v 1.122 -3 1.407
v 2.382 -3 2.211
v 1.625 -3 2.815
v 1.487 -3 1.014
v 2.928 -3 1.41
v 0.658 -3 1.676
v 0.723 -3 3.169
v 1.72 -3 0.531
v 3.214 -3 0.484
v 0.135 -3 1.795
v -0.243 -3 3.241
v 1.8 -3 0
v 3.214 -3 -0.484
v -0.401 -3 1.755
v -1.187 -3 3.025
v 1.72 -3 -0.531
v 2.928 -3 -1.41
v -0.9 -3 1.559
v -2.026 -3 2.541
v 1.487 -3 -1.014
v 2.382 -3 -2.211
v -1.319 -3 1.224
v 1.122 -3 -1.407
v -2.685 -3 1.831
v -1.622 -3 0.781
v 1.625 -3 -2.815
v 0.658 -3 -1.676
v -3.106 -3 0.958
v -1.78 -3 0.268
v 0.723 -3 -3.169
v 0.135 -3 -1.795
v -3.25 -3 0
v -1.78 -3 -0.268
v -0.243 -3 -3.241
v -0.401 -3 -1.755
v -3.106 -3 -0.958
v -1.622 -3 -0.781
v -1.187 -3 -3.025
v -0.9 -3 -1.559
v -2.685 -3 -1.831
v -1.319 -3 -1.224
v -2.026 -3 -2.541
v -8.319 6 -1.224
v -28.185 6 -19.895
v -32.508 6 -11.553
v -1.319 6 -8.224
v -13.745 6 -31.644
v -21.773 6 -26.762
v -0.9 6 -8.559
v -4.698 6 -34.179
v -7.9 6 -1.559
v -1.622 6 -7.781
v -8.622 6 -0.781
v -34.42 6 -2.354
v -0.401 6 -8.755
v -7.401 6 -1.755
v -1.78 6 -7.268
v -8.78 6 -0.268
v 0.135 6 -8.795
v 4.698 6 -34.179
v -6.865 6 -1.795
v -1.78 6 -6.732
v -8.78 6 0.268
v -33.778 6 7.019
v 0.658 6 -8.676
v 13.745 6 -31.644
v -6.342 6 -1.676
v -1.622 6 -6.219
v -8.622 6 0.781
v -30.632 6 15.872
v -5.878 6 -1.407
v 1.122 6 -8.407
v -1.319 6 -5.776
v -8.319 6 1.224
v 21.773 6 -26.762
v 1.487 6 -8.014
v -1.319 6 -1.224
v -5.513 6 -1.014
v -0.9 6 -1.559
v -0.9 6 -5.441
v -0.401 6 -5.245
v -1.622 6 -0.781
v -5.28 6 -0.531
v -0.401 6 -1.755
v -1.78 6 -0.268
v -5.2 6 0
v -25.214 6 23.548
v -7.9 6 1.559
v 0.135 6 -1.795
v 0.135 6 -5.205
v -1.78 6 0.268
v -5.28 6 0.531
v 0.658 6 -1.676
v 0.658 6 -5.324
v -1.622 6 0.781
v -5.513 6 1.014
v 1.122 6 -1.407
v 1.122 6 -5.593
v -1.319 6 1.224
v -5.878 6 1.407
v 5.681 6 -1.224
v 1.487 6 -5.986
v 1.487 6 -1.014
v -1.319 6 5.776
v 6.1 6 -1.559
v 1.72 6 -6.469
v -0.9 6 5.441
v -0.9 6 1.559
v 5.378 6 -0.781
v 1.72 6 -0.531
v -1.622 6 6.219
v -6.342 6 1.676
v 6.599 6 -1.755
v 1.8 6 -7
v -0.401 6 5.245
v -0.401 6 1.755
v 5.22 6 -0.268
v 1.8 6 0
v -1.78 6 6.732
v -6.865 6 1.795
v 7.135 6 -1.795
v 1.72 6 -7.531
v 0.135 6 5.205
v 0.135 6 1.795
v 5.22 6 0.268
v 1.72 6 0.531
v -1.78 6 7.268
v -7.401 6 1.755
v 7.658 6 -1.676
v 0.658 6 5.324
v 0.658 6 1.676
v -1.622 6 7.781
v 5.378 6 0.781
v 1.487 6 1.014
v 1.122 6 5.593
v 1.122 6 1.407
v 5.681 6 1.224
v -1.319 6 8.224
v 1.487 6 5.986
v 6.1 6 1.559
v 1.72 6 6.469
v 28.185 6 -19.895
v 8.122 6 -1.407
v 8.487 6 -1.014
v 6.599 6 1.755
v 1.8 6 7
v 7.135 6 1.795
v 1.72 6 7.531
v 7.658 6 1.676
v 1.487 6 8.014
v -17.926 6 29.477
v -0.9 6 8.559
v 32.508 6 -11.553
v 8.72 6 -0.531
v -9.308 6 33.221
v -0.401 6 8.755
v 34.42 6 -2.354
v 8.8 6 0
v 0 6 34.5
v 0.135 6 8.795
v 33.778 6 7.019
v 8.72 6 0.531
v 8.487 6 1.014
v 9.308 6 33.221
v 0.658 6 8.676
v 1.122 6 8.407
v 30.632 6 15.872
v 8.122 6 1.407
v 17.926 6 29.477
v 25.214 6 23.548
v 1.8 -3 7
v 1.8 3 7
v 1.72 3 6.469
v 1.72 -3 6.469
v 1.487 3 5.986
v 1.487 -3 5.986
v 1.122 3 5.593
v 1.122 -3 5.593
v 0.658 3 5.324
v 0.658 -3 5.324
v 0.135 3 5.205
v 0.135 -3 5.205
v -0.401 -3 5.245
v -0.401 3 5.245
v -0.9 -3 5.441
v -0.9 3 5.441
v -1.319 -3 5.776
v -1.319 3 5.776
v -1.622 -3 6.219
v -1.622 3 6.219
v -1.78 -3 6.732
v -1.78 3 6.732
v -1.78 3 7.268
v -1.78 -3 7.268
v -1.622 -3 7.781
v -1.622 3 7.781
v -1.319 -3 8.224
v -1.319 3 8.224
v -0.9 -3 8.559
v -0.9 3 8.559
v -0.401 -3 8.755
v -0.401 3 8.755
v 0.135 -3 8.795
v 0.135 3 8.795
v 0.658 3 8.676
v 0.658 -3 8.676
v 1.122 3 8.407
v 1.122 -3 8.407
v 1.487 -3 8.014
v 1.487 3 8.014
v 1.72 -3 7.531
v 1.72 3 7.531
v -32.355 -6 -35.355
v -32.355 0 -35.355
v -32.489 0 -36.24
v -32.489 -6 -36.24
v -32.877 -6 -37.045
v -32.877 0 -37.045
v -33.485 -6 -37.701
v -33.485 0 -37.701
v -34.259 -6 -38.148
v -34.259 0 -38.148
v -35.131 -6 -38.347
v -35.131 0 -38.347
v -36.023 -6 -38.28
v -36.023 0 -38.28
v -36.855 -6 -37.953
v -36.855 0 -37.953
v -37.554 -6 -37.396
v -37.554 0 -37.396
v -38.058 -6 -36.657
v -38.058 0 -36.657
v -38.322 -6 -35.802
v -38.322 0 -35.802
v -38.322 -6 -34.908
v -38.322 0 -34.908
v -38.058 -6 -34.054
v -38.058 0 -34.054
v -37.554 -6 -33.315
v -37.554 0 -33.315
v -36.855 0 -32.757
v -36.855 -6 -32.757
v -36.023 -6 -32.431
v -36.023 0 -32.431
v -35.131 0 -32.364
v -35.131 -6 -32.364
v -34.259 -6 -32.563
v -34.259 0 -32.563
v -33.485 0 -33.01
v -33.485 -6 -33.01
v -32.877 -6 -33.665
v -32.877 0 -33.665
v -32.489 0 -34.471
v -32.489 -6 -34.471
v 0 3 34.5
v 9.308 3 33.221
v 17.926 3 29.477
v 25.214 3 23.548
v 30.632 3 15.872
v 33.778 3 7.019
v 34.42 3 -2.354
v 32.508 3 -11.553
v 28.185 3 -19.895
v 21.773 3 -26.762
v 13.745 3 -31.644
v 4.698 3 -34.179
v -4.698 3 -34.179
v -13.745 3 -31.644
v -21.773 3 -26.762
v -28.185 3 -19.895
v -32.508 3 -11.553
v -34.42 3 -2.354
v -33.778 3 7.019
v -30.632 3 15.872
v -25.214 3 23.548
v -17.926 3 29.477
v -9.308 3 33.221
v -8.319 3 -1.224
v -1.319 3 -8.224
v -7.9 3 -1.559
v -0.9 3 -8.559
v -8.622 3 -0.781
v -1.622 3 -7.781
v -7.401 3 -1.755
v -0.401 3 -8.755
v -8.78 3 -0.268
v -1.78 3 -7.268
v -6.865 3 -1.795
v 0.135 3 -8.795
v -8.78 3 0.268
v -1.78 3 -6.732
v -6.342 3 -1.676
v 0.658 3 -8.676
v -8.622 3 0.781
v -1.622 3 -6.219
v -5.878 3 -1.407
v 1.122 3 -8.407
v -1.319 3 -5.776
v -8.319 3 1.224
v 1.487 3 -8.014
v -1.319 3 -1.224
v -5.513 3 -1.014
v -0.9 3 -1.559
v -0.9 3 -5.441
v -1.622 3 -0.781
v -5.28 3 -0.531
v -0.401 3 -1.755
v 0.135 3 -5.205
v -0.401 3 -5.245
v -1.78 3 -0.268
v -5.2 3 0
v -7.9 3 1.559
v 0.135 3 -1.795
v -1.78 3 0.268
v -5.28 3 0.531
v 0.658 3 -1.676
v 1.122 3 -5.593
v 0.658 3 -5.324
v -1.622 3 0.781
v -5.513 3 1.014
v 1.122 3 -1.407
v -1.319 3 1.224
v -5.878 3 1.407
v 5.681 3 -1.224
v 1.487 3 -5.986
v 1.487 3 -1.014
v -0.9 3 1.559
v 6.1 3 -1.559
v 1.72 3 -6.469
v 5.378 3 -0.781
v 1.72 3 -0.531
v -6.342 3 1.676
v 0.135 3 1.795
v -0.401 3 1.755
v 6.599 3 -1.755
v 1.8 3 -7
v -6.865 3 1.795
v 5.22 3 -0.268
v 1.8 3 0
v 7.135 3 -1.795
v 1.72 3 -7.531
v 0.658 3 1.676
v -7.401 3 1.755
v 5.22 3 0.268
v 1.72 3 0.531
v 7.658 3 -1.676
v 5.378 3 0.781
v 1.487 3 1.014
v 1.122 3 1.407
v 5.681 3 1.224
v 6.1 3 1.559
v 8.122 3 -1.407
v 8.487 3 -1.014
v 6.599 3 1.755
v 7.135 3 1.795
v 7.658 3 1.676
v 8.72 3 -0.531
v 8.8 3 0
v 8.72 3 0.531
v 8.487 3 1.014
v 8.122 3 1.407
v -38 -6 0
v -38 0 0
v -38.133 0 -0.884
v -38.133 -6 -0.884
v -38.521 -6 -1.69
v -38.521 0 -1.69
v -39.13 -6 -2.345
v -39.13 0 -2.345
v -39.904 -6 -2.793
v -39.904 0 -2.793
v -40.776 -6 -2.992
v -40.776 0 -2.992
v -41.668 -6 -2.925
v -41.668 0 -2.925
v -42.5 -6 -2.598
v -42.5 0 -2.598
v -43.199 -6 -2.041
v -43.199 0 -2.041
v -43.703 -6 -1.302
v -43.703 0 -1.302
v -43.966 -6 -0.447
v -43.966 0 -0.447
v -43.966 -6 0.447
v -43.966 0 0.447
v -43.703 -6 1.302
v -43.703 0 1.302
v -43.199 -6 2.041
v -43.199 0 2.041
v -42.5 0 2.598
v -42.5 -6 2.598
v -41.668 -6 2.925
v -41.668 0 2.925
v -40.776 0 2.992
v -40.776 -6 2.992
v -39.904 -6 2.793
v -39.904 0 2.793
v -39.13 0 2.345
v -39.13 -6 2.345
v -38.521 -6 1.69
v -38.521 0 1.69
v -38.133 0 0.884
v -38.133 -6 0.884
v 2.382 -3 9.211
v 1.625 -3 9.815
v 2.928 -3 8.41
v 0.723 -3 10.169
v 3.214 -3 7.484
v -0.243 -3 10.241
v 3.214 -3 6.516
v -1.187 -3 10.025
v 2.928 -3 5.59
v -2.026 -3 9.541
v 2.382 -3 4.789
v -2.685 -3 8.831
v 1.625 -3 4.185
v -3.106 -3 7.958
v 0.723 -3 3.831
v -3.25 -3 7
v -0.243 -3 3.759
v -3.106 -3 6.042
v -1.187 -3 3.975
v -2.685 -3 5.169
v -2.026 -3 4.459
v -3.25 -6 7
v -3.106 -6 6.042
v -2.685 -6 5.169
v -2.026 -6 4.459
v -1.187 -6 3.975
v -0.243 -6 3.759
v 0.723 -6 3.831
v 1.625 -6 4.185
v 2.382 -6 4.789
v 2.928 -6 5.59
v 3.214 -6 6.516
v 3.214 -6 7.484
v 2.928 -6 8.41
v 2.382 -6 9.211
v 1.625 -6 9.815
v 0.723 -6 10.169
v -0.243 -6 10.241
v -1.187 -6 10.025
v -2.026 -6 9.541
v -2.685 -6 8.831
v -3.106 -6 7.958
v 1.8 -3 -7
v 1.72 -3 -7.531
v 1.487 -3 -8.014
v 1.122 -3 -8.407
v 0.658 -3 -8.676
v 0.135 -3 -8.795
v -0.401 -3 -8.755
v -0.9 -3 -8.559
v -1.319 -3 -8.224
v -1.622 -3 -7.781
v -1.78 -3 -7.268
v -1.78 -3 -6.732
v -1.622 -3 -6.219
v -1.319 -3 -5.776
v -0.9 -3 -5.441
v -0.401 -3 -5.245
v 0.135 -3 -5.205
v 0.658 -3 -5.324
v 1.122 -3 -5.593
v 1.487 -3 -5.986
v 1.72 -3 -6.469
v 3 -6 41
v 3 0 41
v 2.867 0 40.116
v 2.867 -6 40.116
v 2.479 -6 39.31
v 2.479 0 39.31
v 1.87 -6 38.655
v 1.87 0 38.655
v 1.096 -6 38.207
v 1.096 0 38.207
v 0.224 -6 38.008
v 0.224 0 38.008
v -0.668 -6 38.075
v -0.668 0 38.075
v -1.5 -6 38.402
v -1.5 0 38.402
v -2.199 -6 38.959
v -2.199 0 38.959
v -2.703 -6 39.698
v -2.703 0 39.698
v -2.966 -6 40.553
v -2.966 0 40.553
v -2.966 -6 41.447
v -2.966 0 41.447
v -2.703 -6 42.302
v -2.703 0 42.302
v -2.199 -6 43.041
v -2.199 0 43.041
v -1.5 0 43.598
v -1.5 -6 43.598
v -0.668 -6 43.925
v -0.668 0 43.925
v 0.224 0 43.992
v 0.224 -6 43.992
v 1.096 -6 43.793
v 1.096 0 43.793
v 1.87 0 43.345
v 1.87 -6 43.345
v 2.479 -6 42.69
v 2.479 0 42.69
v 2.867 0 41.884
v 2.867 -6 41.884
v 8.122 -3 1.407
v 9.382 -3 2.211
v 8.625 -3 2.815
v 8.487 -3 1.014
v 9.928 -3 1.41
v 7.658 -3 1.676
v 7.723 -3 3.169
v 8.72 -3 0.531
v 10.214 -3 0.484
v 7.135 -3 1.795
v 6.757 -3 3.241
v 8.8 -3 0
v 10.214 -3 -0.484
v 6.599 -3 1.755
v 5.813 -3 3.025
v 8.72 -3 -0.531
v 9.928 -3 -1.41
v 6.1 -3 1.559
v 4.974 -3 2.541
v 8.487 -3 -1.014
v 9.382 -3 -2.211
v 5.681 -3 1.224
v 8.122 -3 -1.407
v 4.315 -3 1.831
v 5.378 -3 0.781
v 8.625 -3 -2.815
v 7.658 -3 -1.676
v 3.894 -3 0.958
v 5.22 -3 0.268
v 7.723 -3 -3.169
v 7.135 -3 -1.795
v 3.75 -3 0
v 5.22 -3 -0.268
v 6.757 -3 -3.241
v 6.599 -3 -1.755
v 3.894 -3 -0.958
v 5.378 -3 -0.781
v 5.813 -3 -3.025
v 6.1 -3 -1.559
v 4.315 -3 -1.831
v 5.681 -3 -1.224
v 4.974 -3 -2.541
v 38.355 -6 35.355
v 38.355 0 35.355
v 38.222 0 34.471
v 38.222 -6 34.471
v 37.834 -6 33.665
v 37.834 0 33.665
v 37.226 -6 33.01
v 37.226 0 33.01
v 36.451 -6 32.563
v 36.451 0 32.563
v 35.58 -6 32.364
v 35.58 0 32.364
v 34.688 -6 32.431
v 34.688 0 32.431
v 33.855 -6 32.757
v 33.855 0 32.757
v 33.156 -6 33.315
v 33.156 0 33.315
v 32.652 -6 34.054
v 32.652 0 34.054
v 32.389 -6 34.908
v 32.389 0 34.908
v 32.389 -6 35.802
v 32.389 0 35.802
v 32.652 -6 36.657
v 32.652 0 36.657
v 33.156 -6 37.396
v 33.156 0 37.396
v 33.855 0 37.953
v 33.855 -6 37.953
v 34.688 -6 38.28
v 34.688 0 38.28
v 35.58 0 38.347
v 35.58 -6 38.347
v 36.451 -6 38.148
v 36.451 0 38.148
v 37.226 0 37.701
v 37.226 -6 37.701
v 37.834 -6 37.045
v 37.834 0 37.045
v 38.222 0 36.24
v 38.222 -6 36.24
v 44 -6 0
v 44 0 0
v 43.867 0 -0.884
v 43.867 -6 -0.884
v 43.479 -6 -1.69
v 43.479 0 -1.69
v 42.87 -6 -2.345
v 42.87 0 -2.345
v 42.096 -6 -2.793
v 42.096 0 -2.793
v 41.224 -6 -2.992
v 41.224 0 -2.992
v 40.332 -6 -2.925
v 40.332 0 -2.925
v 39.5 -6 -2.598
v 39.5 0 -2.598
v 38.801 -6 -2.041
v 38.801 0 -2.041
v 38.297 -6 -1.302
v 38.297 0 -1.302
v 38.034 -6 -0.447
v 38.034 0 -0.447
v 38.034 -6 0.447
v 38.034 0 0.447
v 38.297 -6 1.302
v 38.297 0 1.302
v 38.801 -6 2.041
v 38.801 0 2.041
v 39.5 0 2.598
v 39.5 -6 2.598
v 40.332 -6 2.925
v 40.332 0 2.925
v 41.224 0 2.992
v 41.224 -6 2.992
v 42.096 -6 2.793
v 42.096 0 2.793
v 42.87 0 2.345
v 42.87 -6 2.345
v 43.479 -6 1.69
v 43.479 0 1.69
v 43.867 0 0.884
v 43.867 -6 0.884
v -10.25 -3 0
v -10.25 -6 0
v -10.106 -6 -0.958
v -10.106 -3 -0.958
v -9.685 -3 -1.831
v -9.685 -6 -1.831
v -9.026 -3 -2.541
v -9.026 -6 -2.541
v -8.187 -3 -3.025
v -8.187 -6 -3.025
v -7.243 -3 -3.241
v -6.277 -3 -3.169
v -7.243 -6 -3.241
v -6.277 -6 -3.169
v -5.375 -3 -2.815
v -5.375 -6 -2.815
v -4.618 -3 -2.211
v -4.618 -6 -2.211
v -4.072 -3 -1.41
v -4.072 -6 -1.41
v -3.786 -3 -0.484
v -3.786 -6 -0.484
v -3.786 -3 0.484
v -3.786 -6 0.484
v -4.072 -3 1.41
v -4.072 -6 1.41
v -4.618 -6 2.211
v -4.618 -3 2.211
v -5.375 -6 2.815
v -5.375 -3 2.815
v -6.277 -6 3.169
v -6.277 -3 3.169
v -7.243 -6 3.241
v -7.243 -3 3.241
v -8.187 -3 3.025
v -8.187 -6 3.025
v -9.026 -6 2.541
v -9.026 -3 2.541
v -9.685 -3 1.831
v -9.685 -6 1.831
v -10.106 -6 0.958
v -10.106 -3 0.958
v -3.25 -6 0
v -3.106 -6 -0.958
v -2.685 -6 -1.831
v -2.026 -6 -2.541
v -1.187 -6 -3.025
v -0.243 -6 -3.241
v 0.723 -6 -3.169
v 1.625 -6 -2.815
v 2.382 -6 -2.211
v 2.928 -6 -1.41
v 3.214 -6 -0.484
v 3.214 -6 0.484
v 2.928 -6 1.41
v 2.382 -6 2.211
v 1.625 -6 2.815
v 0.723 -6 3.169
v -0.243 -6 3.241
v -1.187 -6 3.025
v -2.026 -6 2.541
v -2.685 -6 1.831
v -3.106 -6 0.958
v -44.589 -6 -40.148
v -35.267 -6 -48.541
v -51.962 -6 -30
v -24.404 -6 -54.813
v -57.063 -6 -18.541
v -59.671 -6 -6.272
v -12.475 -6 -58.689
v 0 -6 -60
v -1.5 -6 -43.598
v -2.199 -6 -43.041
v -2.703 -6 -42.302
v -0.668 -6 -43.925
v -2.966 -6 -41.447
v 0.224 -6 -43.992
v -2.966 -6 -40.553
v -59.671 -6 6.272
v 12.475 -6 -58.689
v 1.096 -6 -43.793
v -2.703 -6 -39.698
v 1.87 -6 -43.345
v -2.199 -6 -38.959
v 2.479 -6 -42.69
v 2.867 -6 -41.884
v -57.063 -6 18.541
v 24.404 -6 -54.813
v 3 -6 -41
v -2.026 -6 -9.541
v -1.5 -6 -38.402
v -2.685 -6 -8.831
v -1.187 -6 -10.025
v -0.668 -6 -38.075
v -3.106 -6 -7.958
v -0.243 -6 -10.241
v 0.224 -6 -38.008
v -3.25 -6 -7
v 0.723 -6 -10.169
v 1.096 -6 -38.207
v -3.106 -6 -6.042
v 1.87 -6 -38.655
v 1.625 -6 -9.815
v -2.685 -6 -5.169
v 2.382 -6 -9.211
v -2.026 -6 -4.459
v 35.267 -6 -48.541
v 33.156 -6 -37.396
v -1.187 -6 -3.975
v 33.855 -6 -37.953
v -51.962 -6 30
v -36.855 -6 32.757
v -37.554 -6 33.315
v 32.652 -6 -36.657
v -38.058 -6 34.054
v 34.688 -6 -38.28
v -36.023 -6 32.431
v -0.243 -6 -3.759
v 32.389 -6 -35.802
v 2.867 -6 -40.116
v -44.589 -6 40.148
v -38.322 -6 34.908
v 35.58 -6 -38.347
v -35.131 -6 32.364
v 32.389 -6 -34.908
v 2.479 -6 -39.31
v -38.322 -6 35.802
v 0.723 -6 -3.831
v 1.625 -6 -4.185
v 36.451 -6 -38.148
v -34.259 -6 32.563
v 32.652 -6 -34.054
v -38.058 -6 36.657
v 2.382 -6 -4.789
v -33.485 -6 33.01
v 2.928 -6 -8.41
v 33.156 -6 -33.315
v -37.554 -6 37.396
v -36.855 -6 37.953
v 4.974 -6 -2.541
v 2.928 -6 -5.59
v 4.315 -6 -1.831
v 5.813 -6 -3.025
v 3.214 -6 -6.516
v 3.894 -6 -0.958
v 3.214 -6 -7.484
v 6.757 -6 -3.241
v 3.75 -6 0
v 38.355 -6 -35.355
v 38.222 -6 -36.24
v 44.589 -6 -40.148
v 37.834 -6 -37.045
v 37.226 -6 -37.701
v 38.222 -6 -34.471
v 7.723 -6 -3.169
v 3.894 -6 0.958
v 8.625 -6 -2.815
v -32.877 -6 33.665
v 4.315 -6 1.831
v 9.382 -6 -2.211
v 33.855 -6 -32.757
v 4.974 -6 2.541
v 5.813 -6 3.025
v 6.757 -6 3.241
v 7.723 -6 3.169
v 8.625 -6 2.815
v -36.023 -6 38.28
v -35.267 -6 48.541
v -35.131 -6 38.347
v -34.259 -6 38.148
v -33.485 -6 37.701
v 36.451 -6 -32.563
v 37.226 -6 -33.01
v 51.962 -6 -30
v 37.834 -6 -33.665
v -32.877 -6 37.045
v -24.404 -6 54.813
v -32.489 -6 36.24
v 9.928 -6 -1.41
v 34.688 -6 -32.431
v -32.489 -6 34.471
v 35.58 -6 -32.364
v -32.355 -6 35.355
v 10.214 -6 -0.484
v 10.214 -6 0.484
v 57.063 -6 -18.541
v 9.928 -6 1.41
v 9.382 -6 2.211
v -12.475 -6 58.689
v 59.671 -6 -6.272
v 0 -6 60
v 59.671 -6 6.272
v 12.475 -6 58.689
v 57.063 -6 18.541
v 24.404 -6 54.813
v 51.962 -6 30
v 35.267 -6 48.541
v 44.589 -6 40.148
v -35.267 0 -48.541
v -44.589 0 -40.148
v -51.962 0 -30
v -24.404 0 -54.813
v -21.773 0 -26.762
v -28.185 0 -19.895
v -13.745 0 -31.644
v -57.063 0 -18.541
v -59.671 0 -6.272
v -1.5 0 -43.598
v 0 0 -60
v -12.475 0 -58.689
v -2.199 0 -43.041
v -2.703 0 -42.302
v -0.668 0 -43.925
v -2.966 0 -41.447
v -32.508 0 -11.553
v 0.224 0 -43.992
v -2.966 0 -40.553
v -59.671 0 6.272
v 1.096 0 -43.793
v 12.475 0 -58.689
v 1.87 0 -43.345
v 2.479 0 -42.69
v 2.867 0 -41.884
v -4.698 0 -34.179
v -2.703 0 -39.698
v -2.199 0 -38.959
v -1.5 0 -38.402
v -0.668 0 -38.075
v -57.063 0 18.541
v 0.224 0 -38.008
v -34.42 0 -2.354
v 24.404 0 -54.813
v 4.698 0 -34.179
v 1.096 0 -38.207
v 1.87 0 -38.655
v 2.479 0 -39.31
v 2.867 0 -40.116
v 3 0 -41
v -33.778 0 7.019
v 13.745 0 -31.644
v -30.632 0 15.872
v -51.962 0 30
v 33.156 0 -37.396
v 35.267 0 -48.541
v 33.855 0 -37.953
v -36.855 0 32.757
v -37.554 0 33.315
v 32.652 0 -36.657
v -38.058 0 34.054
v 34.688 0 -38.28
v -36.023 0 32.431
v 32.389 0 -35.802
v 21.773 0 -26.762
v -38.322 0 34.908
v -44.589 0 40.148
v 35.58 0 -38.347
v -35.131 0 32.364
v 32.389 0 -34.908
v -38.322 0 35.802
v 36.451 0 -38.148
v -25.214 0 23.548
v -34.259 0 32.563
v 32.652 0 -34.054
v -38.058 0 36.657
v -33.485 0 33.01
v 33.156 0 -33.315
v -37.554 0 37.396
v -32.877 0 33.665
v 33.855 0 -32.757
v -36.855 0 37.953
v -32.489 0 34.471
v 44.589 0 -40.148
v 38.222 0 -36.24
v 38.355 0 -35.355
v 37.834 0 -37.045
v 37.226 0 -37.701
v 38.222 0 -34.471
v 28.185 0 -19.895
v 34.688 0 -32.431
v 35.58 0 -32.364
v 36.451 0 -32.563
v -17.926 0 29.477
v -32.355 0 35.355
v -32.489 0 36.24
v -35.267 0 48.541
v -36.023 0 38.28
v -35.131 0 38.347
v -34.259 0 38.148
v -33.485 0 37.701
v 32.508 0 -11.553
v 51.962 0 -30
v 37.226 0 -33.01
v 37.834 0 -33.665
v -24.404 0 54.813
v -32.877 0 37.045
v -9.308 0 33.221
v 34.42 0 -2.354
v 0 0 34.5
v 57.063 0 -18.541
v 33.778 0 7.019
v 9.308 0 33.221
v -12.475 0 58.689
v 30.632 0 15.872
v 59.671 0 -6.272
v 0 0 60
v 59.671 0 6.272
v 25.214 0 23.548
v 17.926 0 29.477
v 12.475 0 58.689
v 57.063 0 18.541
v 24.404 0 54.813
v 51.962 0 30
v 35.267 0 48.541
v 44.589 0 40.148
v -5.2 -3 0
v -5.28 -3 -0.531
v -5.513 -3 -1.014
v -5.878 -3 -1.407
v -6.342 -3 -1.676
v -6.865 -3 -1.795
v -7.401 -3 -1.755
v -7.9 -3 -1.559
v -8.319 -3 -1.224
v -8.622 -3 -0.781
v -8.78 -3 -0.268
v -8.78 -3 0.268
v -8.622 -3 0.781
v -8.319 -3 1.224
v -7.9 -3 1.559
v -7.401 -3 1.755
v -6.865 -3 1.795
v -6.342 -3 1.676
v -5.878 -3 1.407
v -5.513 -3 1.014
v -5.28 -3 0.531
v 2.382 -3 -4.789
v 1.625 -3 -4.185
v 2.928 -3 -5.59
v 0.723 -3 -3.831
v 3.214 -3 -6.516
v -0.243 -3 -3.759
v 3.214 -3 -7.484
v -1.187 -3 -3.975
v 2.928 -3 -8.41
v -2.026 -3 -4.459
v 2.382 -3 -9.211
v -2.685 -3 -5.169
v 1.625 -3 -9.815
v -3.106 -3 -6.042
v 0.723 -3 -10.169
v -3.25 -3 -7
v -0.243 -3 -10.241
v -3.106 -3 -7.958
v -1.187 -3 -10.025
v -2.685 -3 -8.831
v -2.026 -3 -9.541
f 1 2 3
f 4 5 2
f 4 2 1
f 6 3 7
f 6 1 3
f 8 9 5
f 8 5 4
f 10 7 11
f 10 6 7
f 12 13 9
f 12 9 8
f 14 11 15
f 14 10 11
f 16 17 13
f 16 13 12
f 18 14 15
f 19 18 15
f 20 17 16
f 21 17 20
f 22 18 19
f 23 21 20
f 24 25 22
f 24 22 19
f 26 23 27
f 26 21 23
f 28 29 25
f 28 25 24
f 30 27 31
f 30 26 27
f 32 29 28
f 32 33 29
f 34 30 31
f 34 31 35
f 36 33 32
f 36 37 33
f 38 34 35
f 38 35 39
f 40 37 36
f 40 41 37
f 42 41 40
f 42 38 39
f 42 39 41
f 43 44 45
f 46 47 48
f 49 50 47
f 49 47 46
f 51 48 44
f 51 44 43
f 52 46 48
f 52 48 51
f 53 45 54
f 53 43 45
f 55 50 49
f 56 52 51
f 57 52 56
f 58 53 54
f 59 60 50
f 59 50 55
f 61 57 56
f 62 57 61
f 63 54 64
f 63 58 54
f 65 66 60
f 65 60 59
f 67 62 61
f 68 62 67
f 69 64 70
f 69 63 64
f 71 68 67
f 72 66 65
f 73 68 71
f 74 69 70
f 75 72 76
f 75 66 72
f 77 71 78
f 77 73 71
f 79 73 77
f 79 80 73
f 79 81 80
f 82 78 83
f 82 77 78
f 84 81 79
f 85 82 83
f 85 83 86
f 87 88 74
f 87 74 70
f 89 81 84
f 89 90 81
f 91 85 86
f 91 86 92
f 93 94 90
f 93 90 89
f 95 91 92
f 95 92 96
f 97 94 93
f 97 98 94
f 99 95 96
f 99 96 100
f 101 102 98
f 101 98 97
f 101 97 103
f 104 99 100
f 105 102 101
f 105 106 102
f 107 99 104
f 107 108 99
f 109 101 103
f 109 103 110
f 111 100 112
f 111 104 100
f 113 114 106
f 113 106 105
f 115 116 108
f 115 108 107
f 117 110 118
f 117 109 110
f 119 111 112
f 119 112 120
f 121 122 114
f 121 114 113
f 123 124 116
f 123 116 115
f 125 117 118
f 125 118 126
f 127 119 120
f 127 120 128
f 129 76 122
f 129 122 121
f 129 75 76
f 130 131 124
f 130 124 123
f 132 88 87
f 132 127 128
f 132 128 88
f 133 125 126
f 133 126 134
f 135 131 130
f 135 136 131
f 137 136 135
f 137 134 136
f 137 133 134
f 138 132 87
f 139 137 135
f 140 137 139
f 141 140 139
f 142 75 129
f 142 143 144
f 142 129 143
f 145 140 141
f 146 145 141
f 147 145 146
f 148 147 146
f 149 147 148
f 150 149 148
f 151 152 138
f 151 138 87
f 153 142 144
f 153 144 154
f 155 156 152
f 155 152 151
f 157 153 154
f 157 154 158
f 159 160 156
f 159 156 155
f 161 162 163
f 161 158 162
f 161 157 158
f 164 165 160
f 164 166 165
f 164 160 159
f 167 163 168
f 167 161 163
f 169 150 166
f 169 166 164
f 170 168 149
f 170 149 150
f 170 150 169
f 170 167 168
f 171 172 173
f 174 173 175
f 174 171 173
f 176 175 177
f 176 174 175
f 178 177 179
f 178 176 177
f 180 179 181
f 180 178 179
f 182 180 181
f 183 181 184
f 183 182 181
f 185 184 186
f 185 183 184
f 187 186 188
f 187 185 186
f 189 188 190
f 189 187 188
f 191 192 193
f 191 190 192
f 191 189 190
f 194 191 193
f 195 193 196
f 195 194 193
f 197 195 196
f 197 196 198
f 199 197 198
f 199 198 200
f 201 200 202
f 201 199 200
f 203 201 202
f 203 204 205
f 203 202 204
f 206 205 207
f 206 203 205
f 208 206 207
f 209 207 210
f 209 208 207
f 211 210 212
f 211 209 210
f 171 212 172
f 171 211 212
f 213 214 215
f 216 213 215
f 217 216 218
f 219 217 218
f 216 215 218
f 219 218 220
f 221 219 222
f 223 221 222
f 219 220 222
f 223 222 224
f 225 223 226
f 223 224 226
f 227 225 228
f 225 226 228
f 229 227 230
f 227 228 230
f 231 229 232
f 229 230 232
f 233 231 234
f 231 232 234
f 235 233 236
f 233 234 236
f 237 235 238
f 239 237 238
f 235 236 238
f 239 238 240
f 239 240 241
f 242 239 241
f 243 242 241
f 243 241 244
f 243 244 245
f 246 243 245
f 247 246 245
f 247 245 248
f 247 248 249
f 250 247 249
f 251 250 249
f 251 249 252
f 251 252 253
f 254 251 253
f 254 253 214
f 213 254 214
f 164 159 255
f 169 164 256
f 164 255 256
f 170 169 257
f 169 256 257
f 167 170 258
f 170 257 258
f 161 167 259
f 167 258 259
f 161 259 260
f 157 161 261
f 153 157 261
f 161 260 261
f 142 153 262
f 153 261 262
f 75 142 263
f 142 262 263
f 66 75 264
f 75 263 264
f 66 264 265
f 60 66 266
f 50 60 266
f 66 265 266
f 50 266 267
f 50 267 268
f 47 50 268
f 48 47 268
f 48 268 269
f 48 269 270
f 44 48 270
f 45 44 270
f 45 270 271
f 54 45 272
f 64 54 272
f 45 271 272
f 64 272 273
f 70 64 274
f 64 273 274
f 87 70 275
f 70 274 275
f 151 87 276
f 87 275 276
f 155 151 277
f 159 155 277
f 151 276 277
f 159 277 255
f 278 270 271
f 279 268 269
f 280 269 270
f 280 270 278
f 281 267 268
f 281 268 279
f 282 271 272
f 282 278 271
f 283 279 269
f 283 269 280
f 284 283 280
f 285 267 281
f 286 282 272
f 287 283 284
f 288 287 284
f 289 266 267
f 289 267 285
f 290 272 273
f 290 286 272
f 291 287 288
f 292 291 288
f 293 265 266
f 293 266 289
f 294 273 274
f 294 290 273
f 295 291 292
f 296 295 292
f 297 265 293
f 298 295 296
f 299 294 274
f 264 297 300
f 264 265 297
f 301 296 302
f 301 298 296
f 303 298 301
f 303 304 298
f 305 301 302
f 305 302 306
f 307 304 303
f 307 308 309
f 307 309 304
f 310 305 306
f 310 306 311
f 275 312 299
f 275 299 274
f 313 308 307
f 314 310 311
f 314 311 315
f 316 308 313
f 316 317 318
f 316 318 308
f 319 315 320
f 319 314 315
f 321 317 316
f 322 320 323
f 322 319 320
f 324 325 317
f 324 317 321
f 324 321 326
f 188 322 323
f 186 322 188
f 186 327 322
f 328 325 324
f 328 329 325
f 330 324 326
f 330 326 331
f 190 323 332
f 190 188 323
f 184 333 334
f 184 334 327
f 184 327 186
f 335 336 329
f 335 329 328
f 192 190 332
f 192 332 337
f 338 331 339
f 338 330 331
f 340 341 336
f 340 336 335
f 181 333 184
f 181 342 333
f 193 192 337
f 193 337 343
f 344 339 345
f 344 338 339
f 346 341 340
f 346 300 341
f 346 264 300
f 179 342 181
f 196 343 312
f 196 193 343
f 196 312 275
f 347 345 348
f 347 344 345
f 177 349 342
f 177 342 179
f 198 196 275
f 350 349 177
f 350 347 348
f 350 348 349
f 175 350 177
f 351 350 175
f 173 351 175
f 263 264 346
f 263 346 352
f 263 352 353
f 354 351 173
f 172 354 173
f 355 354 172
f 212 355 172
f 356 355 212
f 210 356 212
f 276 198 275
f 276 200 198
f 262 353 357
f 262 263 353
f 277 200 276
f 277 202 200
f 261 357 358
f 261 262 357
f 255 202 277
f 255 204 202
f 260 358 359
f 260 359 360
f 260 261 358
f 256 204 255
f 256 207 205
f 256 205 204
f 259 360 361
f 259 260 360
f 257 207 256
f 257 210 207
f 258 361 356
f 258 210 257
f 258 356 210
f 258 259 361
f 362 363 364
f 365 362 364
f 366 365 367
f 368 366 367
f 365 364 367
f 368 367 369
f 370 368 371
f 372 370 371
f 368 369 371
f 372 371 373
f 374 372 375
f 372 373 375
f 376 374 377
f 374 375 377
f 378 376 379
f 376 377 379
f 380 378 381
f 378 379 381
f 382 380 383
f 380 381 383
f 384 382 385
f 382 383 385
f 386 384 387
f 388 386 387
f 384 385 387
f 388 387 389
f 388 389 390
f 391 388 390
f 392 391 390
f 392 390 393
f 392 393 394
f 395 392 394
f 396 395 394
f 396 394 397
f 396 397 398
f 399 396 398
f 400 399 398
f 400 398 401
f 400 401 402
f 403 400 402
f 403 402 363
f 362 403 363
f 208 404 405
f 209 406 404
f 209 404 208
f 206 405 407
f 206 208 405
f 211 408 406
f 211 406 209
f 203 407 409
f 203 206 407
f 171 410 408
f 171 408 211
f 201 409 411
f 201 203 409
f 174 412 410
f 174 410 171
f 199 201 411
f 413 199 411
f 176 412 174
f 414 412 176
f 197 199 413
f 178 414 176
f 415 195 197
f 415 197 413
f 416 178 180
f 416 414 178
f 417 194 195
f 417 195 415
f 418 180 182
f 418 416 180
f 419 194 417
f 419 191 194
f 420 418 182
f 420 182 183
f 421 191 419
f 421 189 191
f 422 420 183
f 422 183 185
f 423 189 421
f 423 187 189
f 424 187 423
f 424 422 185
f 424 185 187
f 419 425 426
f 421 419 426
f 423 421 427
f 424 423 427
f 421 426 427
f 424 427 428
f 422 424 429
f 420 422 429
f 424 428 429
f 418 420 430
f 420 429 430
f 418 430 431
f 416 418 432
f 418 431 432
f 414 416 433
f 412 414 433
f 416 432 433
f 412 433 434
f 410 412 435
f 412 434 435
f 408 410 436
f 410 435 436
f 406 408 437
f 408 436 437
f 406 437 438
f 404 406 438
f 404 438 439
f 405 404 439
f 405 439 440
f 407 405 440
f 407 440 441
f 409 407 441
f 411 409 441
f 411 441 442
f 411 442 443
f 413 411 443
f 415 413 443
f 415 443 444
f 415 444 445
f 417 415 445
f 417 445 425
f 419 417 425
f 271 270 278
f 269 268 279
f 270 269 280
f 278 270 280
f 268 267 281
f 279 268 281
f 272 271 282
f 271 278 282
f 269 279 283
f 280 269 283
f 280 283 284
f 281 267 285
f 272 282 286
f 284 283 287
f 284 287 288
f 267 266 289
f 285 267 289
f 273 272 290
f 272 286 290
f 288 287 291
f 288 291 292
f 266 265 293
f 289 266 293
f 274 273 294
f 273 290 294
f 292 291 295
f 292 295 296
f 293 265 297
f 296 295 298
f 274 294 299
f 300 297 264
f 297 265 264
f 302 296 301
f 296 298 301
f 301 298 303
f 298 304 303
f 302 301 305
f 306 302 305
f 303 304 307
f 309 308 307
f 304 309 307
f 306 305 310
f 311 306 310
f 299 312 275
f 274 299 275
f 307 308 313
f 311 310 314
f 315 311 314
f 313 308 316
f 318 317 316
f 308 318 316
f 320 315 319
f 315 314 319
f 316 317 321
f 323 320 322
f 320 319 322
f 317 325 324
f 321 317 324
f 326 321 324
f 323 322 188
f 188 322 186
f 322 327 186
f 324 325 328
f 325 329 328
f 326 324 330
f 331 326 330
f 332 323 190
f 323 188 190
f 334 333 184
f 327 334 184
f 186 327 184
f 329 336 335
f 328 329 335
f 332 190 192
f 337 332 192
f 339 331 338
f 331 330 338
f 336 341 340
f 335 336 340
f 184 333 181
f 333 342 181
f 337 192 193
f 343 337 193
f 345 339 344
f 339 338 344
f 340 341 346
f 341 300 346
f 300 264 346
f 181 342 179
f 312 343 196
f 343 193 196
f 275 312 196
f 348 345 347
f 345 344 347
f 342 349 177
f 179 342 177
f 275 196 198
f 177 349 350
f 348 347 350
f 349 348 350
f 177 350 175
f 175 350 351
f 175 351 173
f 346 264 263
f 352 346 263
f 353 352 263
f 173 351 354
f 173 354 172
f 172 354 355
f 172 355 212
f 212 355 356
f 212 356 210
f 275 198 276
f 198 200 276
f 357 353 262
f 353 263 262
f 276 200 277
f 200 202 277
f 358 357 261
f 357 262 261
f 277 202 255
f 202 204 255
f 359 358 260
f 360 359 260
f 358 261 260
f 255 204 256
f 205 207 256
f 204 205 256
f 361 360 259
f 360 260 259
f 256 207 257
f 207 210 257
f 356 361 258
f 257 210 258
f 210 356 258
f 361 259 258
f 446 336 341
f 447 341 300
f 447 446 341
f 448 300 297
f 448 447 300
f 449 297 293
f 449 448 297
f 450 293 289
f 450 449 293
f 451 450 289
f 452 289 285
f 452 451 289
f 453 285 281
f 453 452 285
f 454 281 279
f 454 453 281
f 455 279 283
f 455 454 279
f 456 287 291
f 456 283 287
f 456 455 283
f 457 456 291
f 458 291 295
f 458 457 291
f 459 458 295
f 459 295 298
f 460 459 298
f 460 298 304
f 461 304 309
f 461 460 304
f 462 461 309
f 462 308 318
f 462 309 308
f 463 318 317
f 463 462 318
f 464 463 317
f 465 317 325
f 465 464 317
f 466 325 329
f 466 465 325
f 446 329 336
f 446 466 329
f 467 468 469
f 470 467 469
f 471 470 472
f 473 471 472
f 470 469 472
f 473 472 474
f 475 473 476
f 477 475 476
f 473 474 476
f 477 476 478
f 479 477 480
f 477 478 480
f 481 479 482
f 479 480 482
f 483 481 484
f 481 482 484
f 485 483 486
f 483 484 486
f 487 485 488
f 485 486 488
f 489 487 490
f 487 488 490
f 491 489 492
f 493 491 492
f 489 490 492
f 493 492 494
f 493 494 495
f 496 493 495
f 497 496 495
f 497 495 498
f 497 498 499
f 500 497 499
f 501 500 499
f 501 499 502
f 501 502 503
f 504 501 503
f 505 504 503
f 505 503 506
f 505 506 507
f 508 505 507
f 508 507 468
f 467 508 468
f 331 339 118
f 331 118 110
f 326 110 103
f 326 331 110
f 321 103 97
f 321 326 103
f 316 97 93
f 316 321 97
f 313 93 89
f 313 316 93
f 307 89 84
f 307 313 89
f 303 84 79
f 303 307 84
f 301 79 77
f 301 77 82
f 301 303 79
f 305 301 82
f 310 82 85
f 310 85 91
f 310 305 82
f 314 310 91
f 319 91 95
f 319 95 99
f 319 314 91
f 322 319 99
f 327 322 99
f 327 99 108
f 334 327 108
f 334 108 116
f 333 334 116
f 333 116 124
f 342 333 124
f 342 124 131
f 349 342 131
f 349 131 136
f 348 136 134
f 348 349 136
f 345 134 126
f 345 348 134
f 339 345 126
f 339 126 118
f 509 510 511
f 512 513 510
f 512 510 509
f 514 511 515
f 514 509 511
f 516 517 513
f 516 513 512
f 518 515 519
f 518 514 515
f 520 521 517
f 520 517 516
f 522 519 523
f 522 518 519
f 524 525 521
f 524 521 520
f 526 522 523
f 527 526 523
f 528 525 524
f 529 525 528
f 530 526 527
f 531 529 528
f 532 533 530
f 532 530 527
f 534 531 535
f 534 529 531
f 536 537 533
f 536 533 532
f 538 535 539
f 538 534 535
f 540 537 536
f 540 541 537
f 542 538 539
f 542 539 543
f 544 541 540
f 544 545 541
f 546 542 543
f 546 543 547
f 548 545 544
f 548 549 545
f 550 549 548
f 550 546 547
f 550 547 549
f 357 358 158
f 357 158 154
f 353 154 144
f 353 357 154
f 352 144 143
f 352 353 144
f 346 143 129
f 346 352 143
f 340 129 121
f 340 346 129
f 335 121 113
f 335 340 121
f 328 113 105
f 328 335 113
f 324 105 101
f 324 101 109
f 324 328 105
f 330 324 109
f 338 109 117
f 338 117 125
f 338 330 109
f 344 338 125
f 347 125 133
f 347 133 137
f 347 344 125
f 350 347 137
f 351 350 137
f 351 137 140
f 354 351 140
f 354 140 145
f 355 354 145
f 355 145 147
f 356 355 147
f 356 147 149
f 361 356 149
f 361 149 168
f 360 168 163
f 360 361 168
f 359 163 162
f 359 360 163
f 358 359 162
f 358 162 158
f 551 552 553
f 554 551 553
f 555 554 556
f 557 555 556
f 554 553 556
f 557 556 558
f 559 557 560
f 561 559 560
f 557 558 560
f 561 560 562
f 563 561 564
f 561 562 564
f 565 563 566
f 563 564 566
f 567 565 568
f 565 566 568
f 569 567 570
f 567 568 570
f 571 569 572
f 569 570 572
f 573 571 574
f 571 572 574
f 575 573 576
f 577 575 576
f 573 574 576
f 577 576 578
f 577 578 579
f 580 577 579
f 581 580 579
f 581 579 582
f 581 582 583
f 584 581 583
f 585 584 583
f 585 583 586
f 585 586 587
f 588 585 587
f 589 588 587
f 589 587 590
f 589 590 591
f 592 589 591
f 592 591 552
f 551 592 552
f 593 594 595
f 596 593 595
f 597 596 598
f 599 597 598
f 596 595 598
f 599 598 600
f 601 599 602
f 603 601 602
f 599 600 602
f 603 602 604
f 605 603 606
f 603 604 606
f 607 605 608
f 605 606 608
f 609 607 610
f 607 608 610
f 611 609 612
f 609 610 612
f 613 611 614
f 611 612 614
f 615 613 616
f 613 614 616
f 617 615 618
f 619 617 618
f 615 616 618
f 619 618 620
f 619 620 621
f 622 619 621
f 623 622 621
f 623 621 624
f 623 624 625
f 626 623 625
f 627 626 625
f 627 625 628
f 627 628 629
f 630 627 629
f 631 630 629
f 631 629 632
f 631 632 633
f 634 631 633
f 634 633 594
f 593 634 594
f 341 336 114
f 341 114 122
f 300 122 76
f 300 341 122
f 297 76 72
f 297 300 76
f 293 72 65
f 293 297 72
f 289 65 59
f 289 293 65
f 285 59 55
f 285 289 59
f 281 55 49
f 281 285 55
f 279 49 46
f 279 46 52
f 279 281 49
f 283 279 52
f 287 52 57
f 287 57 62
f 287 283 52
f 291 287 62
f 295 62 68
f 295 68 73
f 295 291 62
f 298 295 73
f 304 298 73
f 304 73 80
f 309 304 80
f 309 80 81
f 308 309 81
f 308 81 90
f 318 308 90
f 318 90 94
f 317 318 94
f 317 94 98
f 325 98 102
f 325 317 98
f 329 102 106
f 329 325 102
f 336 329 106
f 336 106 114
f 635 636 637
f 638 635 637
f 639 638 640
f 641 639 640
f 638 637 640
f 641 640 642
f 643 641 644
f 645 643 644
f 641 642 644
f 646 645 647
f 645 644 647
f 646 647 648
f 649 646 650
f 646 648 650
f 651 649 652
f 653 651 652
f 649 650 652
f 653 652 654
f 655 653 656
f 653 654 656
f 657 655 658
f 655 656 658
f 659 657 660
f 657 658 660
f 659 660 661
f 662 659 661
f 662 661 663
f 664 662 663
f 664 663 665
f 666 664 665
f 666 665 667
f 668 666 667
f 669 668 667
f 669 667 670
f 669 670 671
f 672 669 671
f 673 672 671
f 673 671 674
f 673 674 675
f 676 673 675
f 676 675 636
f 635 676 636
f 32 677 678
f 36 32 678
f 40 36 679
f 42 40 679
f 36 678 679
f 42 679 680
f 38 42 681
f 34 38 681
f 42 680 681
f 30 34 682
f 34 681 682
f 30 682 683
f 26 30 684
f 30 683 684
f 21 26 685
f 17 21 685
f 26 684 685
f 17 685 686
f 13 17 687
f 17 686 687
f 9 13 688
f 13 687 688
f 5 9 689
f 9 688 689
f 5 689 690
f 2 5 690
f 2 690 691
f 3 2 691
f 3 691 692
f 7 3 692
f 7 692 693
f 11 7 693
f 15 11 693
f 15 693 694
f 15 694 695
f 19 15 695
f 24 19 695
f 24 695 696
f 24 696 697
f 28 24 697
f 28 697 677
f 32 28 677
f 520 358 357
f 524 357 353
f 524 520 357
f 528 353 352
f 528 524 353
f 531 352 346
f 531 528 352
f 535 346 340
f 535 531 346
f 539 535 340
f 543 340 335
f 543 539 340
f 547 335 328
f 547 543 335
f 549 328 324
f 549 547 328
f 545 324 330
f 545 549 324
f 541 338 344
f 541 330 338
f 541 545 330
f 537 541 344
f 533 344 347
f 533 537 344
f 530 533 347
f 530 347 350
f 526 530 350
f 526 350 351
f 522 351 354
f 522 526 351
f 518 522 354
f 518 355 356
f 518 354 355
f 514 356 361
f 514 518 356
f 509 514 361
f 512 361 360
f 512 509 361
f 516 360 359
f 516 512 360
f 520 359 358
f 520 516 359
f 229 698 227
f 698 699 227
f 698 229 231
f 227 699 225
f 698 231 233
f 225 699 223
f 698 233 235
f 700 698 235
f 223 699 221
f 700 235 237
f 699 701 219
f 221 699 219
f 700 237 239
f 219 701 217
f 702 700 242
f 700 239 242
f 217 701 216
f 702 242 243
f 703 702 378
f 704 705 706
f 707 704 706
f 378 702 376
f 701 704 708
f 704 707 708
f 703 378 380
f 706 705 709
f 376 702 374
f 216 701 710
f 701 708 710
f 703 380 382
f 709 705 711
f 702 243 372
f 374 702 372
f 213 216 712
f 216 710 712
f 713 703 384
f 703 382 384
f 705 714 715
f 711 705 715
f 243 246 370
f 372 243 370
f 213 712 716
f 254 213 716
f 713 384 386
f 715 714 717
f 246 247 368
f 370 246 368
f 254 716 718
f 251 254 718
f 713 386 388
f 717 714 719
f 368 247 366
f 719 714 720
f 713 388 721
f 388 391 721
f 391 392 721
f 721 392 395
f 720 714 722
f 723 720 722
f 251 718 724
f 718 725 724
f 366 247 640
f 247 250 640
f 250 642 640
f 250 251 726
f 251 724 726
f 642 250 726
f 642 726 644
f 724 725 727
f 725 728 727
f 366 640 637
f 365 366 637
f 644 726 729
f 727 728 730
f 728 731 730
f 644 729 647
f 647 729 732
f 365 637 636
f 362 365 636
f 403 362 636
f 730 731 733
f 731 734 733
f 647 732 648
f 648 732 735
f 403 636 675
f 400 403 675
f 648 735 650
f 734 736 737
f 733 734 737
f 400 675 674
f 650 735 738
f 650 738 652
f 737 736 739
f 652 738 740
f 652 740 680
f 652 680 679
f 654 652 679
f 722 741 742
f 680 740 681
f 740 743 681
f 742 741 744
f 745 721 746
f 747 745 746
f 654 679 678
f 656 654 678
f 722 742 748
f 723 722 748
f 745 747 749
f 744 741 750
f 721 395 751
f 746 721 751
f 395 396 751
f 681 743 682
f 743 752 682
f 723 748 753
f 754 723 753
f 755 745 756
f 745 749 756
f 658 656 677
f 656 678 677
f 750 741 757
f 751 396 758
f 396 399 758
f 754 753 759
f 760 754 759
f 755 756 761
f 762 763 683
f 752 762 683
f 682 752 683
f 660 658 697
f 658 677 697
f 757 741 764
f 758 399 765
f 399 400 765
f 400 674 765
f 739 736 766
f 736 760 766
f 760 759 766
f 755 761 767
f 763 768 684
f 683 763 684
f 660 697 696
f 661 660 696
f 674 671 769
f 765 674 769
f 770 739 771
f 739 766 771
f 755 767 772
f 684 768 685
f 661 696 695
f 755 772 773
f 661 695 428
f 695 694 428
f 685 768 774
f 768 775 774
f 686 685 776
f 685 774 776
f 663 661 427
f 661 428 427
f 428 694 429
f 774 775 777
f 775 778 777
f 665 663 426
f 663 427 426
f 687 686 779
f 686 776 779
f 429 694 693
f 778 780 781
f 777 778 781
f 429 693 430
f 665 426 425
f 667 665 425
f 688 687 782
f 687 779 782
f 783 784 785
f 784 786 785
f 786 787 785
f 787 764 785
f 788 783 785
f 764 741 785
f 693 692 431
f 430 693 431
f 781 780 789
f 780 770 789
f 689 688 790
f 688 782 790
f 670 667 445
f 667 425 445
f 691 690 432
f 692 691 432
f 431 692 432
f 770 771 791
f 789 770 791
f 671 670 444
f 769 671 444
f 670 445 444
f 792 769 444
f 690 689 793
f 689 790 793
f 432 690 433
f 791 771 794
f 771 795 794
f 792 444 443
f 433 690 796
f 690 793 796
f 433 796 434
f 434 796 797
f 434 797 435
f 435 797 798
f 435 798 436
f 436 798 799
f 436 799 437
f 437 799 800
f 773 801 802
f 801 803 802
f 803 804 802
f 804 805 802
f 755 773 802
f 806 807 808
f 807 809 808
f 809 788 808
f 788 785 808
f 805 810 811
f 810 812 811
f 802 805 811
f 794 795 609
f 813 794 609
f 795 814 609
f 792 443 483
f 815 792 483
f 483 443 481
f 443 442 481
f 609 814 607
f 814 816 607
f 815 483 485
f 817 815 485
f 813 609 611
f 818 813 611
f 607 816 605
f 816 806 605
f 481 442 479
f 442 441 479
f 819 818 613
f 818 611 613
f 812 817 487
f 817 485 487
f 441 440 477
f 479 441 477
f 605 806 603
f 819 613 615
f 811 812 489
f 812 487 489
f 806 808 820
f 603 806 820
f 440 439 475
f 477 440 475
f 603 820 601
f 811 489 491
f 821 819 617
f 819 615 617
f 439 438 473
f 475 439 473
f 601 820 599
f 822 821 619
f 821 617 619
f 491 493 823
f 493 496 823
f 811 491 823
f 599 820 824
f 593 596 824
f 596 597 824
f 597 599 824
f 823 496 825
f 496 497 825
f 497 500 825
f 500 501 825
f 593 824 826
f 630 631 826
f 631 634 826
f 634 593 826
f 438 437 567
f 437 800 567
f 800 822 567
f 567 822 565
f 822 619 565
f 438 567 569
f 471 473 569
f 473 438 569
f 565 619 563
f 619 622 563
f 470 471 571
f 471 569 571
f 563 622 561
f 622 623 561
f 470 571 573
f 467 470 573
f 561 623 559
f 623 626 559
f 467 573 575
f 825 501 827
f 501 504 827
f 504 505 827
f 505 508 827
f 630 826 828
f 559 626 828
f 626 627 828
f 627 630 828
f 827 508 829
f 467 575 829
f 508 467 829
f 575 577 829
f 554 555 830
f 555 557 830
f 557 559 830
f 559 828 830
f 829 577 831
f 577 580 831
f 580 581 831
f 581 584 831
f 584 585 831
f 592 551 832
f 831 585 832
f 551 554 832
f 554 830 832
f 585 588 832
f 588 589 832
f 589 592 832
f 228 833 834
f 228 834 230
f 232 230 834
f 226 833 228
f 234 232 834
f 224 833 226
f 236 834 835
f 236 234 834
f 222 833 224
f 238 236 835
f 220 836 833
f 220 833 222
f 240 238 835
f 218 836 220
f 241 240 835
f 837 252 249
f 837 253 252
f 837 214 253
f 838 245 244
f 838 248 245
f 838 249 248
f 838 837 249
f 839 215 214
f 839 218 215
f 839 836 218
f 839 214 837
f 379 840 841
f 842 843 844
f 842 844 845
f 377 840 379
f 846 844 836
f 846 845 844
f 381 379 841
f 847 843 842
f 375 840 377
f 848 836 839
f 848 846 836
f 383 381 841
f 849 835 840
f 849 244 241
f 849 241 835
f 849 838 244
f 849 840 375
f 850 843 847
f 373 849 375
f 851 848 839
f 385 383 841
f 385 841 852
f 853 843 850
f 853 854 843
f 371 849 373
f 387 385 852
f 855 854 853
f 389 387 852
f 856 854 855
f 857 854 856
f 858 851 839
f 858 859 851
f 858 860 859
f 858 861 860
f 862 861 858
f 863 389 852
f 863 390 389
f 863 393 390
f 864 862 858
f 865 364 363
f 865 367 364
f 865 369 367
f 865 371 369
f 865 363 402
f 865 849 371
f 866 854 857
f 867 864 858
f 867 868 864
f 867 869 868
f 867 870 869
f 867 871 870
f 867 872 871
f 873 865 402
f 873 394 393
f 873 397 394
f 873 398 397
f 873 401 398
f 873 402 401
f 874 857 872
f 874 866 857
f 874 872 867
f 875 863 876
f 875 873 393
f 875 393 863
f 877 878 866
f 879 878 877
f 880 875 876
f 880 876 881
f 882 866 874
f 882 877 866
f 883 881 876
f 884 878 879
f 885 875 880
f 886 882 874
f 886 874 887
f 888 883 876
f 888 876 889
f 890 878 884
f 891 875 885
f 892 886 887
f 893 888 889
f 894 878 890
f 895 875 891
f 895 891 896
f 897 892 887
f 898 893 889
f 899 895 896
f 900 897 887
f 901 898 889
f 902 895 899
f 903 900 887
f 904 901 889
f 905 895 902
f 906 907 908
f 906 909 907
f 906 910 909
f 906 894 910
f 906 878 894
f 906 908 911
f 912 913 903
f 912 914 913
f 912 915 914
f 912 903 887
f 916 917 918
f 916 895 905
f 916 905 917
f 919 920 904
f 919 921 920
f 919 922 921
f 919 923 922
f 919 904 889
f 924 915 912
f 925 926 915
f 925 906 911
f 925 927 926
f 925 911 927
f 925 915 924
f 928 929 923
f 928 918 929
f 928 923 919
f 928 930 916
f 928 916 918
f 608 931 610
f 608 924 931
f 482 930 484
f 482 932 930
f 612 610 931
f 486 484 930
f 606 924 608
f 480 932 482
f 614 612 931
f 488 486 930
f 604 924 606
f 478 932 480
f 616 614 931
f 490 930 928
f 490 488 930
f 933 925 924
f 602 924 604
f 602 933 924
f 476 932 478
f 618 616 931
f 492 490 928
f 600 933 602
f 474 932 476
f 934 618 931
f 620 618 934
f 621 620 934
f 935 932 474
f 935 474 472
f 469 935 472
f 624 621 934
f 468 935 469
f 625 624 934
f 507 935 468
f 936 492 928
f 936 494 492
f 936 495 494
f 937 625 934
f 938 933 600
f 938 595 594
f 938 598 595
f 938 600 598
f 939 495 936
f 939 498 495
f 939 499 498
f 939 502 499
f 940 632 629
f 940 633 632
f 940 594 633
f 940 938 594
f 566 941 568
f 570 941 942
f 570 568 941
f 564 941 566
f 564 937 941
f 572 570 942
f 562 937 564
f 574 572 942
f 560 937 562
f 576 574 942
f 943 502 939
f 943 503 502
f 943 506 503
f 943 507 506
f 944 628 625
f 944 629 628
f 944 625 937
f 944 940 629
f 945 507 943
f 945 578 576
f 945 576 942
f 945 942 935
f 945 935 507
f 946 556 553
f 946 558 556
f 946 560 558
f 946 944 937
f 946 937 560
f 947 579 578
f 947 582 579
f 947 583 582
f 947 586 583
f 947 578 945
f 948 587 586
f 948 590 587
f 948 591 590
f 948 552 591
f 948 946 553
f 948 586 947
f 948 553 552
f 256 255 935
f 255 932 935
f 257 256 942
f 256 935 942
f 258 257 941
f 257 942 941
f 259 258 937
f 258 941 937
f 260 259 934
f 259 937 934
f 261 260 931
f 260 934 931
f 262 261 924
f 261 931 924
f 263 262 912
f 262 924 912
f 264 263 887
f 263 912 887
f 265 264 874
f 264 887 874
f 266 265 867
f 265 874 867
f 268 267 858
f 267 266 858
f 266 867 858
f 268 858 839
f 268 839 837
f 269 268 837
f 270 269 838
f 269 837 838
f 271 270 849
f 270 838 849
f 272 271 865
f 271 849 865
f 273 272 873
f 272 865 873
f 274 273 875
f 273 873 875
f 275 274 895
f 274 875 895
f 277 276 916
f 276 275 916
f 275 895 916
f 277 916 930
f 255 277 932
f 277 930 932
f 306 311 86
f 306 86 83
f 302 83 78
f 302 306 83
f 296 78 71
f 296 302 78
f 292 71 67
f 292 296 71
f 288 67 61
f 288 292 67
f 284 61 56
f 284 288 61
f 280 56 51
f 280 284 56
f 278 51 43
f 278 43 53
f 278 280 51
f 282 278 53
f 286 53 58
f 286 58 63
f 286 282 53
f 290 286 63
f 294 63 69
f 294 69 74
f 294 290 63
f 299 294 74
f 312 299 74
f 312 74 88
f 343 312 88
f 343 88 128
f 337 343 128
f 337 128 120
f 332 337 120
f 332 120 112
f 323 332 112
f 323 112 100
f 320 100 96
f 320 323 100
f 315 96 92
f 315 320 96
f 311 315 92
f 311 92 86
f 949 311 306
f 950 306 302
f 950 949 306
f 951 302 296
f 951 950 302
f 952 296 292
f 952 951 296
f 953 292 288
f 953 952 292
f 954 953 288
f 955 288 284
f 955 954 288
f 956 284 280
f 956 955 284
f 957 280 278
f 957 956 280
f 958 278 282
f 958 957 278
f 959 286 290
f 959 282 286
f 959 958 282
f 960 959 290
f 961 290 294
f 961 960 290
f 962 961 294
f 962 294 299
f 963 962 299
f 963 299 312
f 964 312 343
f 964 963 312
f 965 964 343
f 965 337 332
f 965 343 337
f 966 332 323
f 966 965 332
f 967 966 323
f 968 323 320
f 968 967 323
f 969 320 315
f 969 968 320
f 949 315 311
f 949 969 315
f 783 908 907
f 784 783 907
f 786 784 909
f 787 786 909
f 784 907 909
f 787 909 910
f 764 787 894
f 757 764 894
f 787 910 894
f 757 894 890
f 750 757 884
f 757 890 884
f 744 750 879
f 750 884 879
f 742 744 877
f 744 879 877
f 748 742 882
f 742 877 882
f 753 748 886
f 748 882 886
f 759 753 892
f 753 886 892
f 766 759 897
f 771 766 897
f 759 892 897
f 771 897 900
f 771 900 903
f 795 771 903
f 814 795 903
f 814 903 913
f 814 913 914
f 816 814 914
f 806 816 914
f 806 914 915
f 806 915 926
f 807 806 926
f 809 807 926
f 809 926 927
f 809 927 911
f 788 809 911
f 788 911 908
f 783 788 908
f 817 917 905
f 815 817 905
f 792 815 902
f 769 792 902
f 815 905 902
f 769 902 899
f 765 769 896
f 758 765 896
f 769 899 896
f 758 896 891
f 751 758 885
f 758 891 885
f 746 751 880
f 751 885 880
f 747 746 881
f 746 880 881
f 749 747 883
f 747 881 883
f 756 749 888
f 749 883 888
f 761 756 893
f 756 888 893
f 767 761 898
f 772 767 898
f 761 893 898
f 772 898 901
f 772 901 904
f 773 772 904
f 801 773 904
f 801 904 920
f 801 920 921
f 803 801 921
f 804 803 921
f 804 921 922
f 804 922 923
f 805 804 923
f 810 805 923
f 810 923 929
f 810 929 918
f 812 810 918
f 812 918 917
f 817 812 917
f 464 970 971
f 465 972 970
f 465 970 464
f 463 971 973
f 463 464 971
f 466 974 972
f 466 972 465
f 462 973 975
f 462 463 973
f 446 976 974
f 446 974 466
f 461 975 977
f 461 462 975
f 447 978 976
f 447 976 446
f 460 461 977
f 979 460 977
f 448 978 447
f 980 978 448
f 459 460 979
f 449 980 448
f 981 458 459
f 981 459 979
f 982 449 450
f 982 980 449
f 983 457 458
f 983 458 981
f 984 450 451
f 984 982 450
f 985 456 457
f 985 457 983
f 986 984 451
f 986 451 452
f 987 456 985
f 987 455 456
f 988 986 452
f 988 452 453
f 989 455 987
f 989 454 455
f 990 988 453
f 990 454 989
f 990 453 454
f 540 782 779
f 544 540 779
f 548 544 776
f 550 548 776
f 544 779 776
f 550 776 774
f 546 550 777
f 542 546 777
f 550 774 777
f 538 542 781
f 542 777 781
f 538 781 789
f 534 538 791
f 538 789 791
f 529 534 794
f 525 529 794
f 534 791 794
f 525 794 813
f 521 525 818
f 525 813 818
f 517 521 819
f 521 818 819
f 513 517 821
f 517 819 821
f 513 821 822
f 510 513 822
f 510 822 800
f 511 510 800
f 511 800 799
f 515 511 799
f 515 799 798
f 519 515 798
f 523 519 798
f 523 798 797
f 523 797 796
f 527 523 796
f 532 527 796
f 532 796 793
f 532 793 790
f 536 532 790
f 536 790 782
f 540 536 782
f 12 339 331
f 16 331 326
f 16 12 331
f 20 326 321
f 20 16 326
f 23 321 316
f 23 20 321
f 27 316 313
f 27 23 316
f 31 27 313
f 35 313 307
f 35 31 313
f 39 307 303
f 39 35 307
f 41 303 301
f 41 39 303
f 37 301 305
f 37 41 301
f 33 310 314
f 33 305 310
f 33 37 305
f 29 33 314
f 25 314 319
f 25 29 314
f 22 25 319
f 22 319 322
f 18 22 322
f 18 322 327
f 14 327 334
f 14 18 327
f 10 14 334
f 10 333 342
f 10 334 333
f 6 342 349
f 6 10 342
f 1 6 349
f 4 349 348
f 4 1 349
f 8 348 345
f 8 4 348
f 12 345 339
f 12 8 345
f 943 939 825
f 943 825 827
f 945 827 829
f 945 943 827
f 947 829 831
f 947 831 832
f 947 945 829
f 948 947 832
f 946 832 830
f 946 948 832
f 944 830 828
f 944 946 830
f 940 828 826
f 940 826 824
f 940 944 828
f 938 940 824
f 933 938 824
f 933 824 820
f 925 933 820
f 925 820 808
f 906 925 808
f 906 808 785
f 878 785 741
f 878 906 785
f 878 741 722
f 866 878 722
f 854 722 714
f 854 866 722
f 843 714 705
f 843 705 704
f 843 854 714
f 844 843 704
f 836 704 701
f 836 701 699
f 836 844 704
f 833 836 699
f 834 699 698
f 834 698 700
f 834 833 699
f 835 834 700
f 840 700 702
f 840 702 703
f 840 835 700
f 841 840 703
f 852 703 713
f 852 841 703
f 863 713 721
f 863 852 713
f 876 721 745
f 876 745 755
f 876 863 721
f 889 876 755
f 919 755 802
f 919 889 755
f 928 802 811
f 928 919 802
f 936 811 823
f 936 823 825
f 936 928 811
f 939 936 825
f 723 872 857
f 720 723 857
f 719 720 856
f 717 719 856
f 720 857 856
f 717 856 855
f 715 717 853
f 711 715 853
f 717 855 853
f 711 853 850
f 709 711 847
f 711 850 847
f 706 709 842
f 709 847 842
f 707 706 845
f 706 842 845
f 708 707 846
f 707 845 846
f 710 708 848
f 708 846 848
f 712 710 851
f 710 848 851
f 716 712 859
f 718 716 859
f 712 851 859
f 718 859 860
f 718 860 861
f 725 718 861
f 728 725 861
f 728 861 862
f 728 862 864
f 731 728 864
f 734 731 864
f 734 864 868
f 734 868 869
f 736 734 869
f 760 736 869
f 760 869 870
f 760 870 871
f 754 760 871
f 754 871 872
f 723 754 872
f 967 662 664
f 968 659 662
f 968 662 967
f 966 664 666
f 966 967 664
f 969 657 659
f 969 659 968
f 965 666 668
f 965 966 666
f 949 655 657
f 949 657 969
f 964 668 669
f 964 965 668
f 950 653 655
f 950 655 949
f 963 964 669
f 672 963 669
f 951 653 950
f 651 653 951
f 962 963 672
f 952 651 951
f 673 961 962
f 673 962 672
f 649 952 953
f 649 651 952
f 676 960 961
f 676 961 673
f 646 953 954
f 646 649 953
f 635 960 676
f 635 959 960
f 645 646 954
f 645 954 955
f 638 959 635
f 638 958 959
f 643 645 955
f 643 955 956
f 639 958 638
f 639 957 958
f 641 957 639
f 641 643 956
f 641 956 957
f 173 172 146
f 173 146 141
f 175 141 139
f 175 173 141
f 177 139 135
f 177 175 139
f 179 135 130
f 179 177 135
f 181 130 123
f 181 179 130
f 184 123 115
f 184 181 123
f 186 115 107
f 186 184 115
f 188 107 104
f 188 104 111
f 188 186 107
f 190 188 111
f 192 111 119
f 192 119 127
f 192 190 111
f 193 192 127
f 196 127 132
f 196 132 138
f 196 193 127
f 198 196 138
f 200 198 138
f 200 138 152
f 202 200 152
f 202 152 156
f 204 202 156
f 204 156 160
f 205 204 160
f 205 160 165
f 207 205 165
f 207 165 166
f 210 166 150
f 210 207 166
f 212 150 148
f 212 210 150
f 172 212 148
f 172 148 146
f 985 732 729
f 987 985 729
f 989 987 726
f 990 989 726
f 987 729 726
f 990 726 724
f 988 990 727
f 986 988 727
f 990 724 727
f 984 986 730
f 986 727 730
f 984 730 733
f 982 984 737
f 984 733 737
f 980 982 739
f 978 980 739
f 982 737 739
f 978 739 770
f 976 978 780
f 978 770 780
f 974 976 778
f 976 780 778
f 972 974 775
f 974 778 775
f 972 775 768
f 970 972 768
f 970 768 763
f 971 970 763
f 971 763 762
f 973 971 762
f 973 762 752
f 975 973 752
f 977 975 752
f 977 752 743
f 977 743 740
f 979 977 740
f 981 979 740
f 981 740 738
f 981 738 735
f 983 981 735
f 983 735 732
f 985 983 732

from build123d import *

# Parameters (mm, degrees)
SKETCH1_R                      = 60
BOSS_EXTRUDE1_DEPTH            = 6
SKETCH3_R                      = 34.5
BOSS_EXTRUDE3_DEPTH            = 3
F_6_0_6_DIAMETER_HOLE1_D       = 6
F_6_0_6_DIAMETER_HOLE2_D       = 6
CBORE_FOR_M3_SHCS1_D           = 3.6
CBORE_FOR_M3_SHCS1_CBORE_D     = 6.5
CBORE_FOR_M3_SHCS1_CBORE_DEPTH = 3
MOVE_FACE1_BY                  = 3


with BuildPart() as part:
    # Sketch1 → Boss-Extrude1 (new body)
    with BuildSketch(Plane(origin=(0, 0, 0), x_dir=(1, 0, 0), z_dir=(0, 1, 0))):
        Circle(SKETCH1_R)
    extrude(amount=-BOSS_EXTRUDE1_DEPTH)

    # Sketch3 → Boss-Extrude3 (add)
    with BuildSketch(Plane(origin=(0, 0, 0), x_dir=(1, 0, 0), z_dir=(0, 1, 0))):
        Circle(SKETCH3_R)
    extrude(amount=BOSS_EXTRUDE3_DEPTH)

    # Ø6.0 (6) Diameter Hole1 (through all)
    with Locations(Plane(origin=(0, -6, 0), x_dir=(-1, 0, 0), z_dir=(0, -1, 0))):
        with Locations((0, 41), (0, -41), (41, 0), (-41, 0)):
            Hole(F_6_0_6_DIAMETER_HOLE1_D / 2)

    # Ø6.0 (6) Diameter Hole2 (through all)
    with Locations(Plane(origin=(0, -6, 0), x_dir=(-1, 0, 0), z_dir=(0, -1, 0))):
        with Locations((-35.355339059, 35.355339059), (35.355339059, -35.355339059), (-35.355339059, -35.355339059), (35.355339059, 35.355339059)):
            Hole(F_6_0_6_DIAMETER_HOLE2_D / 2)

    # CBORE for M3 SHCS1 (through all)
    with Locations(Plane(origin=(0, -6, 0), x_dir=(-1, 0, 0), z_dir=(0, -1, 0))):
        with Locations((0, 0), (0, 7), (0, -7), (-7, 0), (7, 0)):
            CounterBoreHole(CBORE_FOR_M3_SHCS1_D / 2, CBORE_FOR_M3_SHCS1_CBORE_D / 2, CBORE_FOR_M3_SHCS1_CBORE_DEPTH)

    # Move Face1: a face moved outward by 3.0
    extrude(part.faces().sort_by_distance((0, 3, 17.25))[0], amount=MOVE_FACE1_BY, dir=(0, 1, 0))


with BuildPart() as body_2:
    # Split1: the piece on the far side of the plane
    add(part.part)
    split(bisect_by=Plane.ZX.offset(3), keep=Keep.BOTTOM)


with BuildPart() as part_1:
    add(part.part)

    # Split1
    split(bisect_by=Plane.ZX.offset(3), keep=Keep.TOP)


solid = Compound([body_2.part, part_1.part])
